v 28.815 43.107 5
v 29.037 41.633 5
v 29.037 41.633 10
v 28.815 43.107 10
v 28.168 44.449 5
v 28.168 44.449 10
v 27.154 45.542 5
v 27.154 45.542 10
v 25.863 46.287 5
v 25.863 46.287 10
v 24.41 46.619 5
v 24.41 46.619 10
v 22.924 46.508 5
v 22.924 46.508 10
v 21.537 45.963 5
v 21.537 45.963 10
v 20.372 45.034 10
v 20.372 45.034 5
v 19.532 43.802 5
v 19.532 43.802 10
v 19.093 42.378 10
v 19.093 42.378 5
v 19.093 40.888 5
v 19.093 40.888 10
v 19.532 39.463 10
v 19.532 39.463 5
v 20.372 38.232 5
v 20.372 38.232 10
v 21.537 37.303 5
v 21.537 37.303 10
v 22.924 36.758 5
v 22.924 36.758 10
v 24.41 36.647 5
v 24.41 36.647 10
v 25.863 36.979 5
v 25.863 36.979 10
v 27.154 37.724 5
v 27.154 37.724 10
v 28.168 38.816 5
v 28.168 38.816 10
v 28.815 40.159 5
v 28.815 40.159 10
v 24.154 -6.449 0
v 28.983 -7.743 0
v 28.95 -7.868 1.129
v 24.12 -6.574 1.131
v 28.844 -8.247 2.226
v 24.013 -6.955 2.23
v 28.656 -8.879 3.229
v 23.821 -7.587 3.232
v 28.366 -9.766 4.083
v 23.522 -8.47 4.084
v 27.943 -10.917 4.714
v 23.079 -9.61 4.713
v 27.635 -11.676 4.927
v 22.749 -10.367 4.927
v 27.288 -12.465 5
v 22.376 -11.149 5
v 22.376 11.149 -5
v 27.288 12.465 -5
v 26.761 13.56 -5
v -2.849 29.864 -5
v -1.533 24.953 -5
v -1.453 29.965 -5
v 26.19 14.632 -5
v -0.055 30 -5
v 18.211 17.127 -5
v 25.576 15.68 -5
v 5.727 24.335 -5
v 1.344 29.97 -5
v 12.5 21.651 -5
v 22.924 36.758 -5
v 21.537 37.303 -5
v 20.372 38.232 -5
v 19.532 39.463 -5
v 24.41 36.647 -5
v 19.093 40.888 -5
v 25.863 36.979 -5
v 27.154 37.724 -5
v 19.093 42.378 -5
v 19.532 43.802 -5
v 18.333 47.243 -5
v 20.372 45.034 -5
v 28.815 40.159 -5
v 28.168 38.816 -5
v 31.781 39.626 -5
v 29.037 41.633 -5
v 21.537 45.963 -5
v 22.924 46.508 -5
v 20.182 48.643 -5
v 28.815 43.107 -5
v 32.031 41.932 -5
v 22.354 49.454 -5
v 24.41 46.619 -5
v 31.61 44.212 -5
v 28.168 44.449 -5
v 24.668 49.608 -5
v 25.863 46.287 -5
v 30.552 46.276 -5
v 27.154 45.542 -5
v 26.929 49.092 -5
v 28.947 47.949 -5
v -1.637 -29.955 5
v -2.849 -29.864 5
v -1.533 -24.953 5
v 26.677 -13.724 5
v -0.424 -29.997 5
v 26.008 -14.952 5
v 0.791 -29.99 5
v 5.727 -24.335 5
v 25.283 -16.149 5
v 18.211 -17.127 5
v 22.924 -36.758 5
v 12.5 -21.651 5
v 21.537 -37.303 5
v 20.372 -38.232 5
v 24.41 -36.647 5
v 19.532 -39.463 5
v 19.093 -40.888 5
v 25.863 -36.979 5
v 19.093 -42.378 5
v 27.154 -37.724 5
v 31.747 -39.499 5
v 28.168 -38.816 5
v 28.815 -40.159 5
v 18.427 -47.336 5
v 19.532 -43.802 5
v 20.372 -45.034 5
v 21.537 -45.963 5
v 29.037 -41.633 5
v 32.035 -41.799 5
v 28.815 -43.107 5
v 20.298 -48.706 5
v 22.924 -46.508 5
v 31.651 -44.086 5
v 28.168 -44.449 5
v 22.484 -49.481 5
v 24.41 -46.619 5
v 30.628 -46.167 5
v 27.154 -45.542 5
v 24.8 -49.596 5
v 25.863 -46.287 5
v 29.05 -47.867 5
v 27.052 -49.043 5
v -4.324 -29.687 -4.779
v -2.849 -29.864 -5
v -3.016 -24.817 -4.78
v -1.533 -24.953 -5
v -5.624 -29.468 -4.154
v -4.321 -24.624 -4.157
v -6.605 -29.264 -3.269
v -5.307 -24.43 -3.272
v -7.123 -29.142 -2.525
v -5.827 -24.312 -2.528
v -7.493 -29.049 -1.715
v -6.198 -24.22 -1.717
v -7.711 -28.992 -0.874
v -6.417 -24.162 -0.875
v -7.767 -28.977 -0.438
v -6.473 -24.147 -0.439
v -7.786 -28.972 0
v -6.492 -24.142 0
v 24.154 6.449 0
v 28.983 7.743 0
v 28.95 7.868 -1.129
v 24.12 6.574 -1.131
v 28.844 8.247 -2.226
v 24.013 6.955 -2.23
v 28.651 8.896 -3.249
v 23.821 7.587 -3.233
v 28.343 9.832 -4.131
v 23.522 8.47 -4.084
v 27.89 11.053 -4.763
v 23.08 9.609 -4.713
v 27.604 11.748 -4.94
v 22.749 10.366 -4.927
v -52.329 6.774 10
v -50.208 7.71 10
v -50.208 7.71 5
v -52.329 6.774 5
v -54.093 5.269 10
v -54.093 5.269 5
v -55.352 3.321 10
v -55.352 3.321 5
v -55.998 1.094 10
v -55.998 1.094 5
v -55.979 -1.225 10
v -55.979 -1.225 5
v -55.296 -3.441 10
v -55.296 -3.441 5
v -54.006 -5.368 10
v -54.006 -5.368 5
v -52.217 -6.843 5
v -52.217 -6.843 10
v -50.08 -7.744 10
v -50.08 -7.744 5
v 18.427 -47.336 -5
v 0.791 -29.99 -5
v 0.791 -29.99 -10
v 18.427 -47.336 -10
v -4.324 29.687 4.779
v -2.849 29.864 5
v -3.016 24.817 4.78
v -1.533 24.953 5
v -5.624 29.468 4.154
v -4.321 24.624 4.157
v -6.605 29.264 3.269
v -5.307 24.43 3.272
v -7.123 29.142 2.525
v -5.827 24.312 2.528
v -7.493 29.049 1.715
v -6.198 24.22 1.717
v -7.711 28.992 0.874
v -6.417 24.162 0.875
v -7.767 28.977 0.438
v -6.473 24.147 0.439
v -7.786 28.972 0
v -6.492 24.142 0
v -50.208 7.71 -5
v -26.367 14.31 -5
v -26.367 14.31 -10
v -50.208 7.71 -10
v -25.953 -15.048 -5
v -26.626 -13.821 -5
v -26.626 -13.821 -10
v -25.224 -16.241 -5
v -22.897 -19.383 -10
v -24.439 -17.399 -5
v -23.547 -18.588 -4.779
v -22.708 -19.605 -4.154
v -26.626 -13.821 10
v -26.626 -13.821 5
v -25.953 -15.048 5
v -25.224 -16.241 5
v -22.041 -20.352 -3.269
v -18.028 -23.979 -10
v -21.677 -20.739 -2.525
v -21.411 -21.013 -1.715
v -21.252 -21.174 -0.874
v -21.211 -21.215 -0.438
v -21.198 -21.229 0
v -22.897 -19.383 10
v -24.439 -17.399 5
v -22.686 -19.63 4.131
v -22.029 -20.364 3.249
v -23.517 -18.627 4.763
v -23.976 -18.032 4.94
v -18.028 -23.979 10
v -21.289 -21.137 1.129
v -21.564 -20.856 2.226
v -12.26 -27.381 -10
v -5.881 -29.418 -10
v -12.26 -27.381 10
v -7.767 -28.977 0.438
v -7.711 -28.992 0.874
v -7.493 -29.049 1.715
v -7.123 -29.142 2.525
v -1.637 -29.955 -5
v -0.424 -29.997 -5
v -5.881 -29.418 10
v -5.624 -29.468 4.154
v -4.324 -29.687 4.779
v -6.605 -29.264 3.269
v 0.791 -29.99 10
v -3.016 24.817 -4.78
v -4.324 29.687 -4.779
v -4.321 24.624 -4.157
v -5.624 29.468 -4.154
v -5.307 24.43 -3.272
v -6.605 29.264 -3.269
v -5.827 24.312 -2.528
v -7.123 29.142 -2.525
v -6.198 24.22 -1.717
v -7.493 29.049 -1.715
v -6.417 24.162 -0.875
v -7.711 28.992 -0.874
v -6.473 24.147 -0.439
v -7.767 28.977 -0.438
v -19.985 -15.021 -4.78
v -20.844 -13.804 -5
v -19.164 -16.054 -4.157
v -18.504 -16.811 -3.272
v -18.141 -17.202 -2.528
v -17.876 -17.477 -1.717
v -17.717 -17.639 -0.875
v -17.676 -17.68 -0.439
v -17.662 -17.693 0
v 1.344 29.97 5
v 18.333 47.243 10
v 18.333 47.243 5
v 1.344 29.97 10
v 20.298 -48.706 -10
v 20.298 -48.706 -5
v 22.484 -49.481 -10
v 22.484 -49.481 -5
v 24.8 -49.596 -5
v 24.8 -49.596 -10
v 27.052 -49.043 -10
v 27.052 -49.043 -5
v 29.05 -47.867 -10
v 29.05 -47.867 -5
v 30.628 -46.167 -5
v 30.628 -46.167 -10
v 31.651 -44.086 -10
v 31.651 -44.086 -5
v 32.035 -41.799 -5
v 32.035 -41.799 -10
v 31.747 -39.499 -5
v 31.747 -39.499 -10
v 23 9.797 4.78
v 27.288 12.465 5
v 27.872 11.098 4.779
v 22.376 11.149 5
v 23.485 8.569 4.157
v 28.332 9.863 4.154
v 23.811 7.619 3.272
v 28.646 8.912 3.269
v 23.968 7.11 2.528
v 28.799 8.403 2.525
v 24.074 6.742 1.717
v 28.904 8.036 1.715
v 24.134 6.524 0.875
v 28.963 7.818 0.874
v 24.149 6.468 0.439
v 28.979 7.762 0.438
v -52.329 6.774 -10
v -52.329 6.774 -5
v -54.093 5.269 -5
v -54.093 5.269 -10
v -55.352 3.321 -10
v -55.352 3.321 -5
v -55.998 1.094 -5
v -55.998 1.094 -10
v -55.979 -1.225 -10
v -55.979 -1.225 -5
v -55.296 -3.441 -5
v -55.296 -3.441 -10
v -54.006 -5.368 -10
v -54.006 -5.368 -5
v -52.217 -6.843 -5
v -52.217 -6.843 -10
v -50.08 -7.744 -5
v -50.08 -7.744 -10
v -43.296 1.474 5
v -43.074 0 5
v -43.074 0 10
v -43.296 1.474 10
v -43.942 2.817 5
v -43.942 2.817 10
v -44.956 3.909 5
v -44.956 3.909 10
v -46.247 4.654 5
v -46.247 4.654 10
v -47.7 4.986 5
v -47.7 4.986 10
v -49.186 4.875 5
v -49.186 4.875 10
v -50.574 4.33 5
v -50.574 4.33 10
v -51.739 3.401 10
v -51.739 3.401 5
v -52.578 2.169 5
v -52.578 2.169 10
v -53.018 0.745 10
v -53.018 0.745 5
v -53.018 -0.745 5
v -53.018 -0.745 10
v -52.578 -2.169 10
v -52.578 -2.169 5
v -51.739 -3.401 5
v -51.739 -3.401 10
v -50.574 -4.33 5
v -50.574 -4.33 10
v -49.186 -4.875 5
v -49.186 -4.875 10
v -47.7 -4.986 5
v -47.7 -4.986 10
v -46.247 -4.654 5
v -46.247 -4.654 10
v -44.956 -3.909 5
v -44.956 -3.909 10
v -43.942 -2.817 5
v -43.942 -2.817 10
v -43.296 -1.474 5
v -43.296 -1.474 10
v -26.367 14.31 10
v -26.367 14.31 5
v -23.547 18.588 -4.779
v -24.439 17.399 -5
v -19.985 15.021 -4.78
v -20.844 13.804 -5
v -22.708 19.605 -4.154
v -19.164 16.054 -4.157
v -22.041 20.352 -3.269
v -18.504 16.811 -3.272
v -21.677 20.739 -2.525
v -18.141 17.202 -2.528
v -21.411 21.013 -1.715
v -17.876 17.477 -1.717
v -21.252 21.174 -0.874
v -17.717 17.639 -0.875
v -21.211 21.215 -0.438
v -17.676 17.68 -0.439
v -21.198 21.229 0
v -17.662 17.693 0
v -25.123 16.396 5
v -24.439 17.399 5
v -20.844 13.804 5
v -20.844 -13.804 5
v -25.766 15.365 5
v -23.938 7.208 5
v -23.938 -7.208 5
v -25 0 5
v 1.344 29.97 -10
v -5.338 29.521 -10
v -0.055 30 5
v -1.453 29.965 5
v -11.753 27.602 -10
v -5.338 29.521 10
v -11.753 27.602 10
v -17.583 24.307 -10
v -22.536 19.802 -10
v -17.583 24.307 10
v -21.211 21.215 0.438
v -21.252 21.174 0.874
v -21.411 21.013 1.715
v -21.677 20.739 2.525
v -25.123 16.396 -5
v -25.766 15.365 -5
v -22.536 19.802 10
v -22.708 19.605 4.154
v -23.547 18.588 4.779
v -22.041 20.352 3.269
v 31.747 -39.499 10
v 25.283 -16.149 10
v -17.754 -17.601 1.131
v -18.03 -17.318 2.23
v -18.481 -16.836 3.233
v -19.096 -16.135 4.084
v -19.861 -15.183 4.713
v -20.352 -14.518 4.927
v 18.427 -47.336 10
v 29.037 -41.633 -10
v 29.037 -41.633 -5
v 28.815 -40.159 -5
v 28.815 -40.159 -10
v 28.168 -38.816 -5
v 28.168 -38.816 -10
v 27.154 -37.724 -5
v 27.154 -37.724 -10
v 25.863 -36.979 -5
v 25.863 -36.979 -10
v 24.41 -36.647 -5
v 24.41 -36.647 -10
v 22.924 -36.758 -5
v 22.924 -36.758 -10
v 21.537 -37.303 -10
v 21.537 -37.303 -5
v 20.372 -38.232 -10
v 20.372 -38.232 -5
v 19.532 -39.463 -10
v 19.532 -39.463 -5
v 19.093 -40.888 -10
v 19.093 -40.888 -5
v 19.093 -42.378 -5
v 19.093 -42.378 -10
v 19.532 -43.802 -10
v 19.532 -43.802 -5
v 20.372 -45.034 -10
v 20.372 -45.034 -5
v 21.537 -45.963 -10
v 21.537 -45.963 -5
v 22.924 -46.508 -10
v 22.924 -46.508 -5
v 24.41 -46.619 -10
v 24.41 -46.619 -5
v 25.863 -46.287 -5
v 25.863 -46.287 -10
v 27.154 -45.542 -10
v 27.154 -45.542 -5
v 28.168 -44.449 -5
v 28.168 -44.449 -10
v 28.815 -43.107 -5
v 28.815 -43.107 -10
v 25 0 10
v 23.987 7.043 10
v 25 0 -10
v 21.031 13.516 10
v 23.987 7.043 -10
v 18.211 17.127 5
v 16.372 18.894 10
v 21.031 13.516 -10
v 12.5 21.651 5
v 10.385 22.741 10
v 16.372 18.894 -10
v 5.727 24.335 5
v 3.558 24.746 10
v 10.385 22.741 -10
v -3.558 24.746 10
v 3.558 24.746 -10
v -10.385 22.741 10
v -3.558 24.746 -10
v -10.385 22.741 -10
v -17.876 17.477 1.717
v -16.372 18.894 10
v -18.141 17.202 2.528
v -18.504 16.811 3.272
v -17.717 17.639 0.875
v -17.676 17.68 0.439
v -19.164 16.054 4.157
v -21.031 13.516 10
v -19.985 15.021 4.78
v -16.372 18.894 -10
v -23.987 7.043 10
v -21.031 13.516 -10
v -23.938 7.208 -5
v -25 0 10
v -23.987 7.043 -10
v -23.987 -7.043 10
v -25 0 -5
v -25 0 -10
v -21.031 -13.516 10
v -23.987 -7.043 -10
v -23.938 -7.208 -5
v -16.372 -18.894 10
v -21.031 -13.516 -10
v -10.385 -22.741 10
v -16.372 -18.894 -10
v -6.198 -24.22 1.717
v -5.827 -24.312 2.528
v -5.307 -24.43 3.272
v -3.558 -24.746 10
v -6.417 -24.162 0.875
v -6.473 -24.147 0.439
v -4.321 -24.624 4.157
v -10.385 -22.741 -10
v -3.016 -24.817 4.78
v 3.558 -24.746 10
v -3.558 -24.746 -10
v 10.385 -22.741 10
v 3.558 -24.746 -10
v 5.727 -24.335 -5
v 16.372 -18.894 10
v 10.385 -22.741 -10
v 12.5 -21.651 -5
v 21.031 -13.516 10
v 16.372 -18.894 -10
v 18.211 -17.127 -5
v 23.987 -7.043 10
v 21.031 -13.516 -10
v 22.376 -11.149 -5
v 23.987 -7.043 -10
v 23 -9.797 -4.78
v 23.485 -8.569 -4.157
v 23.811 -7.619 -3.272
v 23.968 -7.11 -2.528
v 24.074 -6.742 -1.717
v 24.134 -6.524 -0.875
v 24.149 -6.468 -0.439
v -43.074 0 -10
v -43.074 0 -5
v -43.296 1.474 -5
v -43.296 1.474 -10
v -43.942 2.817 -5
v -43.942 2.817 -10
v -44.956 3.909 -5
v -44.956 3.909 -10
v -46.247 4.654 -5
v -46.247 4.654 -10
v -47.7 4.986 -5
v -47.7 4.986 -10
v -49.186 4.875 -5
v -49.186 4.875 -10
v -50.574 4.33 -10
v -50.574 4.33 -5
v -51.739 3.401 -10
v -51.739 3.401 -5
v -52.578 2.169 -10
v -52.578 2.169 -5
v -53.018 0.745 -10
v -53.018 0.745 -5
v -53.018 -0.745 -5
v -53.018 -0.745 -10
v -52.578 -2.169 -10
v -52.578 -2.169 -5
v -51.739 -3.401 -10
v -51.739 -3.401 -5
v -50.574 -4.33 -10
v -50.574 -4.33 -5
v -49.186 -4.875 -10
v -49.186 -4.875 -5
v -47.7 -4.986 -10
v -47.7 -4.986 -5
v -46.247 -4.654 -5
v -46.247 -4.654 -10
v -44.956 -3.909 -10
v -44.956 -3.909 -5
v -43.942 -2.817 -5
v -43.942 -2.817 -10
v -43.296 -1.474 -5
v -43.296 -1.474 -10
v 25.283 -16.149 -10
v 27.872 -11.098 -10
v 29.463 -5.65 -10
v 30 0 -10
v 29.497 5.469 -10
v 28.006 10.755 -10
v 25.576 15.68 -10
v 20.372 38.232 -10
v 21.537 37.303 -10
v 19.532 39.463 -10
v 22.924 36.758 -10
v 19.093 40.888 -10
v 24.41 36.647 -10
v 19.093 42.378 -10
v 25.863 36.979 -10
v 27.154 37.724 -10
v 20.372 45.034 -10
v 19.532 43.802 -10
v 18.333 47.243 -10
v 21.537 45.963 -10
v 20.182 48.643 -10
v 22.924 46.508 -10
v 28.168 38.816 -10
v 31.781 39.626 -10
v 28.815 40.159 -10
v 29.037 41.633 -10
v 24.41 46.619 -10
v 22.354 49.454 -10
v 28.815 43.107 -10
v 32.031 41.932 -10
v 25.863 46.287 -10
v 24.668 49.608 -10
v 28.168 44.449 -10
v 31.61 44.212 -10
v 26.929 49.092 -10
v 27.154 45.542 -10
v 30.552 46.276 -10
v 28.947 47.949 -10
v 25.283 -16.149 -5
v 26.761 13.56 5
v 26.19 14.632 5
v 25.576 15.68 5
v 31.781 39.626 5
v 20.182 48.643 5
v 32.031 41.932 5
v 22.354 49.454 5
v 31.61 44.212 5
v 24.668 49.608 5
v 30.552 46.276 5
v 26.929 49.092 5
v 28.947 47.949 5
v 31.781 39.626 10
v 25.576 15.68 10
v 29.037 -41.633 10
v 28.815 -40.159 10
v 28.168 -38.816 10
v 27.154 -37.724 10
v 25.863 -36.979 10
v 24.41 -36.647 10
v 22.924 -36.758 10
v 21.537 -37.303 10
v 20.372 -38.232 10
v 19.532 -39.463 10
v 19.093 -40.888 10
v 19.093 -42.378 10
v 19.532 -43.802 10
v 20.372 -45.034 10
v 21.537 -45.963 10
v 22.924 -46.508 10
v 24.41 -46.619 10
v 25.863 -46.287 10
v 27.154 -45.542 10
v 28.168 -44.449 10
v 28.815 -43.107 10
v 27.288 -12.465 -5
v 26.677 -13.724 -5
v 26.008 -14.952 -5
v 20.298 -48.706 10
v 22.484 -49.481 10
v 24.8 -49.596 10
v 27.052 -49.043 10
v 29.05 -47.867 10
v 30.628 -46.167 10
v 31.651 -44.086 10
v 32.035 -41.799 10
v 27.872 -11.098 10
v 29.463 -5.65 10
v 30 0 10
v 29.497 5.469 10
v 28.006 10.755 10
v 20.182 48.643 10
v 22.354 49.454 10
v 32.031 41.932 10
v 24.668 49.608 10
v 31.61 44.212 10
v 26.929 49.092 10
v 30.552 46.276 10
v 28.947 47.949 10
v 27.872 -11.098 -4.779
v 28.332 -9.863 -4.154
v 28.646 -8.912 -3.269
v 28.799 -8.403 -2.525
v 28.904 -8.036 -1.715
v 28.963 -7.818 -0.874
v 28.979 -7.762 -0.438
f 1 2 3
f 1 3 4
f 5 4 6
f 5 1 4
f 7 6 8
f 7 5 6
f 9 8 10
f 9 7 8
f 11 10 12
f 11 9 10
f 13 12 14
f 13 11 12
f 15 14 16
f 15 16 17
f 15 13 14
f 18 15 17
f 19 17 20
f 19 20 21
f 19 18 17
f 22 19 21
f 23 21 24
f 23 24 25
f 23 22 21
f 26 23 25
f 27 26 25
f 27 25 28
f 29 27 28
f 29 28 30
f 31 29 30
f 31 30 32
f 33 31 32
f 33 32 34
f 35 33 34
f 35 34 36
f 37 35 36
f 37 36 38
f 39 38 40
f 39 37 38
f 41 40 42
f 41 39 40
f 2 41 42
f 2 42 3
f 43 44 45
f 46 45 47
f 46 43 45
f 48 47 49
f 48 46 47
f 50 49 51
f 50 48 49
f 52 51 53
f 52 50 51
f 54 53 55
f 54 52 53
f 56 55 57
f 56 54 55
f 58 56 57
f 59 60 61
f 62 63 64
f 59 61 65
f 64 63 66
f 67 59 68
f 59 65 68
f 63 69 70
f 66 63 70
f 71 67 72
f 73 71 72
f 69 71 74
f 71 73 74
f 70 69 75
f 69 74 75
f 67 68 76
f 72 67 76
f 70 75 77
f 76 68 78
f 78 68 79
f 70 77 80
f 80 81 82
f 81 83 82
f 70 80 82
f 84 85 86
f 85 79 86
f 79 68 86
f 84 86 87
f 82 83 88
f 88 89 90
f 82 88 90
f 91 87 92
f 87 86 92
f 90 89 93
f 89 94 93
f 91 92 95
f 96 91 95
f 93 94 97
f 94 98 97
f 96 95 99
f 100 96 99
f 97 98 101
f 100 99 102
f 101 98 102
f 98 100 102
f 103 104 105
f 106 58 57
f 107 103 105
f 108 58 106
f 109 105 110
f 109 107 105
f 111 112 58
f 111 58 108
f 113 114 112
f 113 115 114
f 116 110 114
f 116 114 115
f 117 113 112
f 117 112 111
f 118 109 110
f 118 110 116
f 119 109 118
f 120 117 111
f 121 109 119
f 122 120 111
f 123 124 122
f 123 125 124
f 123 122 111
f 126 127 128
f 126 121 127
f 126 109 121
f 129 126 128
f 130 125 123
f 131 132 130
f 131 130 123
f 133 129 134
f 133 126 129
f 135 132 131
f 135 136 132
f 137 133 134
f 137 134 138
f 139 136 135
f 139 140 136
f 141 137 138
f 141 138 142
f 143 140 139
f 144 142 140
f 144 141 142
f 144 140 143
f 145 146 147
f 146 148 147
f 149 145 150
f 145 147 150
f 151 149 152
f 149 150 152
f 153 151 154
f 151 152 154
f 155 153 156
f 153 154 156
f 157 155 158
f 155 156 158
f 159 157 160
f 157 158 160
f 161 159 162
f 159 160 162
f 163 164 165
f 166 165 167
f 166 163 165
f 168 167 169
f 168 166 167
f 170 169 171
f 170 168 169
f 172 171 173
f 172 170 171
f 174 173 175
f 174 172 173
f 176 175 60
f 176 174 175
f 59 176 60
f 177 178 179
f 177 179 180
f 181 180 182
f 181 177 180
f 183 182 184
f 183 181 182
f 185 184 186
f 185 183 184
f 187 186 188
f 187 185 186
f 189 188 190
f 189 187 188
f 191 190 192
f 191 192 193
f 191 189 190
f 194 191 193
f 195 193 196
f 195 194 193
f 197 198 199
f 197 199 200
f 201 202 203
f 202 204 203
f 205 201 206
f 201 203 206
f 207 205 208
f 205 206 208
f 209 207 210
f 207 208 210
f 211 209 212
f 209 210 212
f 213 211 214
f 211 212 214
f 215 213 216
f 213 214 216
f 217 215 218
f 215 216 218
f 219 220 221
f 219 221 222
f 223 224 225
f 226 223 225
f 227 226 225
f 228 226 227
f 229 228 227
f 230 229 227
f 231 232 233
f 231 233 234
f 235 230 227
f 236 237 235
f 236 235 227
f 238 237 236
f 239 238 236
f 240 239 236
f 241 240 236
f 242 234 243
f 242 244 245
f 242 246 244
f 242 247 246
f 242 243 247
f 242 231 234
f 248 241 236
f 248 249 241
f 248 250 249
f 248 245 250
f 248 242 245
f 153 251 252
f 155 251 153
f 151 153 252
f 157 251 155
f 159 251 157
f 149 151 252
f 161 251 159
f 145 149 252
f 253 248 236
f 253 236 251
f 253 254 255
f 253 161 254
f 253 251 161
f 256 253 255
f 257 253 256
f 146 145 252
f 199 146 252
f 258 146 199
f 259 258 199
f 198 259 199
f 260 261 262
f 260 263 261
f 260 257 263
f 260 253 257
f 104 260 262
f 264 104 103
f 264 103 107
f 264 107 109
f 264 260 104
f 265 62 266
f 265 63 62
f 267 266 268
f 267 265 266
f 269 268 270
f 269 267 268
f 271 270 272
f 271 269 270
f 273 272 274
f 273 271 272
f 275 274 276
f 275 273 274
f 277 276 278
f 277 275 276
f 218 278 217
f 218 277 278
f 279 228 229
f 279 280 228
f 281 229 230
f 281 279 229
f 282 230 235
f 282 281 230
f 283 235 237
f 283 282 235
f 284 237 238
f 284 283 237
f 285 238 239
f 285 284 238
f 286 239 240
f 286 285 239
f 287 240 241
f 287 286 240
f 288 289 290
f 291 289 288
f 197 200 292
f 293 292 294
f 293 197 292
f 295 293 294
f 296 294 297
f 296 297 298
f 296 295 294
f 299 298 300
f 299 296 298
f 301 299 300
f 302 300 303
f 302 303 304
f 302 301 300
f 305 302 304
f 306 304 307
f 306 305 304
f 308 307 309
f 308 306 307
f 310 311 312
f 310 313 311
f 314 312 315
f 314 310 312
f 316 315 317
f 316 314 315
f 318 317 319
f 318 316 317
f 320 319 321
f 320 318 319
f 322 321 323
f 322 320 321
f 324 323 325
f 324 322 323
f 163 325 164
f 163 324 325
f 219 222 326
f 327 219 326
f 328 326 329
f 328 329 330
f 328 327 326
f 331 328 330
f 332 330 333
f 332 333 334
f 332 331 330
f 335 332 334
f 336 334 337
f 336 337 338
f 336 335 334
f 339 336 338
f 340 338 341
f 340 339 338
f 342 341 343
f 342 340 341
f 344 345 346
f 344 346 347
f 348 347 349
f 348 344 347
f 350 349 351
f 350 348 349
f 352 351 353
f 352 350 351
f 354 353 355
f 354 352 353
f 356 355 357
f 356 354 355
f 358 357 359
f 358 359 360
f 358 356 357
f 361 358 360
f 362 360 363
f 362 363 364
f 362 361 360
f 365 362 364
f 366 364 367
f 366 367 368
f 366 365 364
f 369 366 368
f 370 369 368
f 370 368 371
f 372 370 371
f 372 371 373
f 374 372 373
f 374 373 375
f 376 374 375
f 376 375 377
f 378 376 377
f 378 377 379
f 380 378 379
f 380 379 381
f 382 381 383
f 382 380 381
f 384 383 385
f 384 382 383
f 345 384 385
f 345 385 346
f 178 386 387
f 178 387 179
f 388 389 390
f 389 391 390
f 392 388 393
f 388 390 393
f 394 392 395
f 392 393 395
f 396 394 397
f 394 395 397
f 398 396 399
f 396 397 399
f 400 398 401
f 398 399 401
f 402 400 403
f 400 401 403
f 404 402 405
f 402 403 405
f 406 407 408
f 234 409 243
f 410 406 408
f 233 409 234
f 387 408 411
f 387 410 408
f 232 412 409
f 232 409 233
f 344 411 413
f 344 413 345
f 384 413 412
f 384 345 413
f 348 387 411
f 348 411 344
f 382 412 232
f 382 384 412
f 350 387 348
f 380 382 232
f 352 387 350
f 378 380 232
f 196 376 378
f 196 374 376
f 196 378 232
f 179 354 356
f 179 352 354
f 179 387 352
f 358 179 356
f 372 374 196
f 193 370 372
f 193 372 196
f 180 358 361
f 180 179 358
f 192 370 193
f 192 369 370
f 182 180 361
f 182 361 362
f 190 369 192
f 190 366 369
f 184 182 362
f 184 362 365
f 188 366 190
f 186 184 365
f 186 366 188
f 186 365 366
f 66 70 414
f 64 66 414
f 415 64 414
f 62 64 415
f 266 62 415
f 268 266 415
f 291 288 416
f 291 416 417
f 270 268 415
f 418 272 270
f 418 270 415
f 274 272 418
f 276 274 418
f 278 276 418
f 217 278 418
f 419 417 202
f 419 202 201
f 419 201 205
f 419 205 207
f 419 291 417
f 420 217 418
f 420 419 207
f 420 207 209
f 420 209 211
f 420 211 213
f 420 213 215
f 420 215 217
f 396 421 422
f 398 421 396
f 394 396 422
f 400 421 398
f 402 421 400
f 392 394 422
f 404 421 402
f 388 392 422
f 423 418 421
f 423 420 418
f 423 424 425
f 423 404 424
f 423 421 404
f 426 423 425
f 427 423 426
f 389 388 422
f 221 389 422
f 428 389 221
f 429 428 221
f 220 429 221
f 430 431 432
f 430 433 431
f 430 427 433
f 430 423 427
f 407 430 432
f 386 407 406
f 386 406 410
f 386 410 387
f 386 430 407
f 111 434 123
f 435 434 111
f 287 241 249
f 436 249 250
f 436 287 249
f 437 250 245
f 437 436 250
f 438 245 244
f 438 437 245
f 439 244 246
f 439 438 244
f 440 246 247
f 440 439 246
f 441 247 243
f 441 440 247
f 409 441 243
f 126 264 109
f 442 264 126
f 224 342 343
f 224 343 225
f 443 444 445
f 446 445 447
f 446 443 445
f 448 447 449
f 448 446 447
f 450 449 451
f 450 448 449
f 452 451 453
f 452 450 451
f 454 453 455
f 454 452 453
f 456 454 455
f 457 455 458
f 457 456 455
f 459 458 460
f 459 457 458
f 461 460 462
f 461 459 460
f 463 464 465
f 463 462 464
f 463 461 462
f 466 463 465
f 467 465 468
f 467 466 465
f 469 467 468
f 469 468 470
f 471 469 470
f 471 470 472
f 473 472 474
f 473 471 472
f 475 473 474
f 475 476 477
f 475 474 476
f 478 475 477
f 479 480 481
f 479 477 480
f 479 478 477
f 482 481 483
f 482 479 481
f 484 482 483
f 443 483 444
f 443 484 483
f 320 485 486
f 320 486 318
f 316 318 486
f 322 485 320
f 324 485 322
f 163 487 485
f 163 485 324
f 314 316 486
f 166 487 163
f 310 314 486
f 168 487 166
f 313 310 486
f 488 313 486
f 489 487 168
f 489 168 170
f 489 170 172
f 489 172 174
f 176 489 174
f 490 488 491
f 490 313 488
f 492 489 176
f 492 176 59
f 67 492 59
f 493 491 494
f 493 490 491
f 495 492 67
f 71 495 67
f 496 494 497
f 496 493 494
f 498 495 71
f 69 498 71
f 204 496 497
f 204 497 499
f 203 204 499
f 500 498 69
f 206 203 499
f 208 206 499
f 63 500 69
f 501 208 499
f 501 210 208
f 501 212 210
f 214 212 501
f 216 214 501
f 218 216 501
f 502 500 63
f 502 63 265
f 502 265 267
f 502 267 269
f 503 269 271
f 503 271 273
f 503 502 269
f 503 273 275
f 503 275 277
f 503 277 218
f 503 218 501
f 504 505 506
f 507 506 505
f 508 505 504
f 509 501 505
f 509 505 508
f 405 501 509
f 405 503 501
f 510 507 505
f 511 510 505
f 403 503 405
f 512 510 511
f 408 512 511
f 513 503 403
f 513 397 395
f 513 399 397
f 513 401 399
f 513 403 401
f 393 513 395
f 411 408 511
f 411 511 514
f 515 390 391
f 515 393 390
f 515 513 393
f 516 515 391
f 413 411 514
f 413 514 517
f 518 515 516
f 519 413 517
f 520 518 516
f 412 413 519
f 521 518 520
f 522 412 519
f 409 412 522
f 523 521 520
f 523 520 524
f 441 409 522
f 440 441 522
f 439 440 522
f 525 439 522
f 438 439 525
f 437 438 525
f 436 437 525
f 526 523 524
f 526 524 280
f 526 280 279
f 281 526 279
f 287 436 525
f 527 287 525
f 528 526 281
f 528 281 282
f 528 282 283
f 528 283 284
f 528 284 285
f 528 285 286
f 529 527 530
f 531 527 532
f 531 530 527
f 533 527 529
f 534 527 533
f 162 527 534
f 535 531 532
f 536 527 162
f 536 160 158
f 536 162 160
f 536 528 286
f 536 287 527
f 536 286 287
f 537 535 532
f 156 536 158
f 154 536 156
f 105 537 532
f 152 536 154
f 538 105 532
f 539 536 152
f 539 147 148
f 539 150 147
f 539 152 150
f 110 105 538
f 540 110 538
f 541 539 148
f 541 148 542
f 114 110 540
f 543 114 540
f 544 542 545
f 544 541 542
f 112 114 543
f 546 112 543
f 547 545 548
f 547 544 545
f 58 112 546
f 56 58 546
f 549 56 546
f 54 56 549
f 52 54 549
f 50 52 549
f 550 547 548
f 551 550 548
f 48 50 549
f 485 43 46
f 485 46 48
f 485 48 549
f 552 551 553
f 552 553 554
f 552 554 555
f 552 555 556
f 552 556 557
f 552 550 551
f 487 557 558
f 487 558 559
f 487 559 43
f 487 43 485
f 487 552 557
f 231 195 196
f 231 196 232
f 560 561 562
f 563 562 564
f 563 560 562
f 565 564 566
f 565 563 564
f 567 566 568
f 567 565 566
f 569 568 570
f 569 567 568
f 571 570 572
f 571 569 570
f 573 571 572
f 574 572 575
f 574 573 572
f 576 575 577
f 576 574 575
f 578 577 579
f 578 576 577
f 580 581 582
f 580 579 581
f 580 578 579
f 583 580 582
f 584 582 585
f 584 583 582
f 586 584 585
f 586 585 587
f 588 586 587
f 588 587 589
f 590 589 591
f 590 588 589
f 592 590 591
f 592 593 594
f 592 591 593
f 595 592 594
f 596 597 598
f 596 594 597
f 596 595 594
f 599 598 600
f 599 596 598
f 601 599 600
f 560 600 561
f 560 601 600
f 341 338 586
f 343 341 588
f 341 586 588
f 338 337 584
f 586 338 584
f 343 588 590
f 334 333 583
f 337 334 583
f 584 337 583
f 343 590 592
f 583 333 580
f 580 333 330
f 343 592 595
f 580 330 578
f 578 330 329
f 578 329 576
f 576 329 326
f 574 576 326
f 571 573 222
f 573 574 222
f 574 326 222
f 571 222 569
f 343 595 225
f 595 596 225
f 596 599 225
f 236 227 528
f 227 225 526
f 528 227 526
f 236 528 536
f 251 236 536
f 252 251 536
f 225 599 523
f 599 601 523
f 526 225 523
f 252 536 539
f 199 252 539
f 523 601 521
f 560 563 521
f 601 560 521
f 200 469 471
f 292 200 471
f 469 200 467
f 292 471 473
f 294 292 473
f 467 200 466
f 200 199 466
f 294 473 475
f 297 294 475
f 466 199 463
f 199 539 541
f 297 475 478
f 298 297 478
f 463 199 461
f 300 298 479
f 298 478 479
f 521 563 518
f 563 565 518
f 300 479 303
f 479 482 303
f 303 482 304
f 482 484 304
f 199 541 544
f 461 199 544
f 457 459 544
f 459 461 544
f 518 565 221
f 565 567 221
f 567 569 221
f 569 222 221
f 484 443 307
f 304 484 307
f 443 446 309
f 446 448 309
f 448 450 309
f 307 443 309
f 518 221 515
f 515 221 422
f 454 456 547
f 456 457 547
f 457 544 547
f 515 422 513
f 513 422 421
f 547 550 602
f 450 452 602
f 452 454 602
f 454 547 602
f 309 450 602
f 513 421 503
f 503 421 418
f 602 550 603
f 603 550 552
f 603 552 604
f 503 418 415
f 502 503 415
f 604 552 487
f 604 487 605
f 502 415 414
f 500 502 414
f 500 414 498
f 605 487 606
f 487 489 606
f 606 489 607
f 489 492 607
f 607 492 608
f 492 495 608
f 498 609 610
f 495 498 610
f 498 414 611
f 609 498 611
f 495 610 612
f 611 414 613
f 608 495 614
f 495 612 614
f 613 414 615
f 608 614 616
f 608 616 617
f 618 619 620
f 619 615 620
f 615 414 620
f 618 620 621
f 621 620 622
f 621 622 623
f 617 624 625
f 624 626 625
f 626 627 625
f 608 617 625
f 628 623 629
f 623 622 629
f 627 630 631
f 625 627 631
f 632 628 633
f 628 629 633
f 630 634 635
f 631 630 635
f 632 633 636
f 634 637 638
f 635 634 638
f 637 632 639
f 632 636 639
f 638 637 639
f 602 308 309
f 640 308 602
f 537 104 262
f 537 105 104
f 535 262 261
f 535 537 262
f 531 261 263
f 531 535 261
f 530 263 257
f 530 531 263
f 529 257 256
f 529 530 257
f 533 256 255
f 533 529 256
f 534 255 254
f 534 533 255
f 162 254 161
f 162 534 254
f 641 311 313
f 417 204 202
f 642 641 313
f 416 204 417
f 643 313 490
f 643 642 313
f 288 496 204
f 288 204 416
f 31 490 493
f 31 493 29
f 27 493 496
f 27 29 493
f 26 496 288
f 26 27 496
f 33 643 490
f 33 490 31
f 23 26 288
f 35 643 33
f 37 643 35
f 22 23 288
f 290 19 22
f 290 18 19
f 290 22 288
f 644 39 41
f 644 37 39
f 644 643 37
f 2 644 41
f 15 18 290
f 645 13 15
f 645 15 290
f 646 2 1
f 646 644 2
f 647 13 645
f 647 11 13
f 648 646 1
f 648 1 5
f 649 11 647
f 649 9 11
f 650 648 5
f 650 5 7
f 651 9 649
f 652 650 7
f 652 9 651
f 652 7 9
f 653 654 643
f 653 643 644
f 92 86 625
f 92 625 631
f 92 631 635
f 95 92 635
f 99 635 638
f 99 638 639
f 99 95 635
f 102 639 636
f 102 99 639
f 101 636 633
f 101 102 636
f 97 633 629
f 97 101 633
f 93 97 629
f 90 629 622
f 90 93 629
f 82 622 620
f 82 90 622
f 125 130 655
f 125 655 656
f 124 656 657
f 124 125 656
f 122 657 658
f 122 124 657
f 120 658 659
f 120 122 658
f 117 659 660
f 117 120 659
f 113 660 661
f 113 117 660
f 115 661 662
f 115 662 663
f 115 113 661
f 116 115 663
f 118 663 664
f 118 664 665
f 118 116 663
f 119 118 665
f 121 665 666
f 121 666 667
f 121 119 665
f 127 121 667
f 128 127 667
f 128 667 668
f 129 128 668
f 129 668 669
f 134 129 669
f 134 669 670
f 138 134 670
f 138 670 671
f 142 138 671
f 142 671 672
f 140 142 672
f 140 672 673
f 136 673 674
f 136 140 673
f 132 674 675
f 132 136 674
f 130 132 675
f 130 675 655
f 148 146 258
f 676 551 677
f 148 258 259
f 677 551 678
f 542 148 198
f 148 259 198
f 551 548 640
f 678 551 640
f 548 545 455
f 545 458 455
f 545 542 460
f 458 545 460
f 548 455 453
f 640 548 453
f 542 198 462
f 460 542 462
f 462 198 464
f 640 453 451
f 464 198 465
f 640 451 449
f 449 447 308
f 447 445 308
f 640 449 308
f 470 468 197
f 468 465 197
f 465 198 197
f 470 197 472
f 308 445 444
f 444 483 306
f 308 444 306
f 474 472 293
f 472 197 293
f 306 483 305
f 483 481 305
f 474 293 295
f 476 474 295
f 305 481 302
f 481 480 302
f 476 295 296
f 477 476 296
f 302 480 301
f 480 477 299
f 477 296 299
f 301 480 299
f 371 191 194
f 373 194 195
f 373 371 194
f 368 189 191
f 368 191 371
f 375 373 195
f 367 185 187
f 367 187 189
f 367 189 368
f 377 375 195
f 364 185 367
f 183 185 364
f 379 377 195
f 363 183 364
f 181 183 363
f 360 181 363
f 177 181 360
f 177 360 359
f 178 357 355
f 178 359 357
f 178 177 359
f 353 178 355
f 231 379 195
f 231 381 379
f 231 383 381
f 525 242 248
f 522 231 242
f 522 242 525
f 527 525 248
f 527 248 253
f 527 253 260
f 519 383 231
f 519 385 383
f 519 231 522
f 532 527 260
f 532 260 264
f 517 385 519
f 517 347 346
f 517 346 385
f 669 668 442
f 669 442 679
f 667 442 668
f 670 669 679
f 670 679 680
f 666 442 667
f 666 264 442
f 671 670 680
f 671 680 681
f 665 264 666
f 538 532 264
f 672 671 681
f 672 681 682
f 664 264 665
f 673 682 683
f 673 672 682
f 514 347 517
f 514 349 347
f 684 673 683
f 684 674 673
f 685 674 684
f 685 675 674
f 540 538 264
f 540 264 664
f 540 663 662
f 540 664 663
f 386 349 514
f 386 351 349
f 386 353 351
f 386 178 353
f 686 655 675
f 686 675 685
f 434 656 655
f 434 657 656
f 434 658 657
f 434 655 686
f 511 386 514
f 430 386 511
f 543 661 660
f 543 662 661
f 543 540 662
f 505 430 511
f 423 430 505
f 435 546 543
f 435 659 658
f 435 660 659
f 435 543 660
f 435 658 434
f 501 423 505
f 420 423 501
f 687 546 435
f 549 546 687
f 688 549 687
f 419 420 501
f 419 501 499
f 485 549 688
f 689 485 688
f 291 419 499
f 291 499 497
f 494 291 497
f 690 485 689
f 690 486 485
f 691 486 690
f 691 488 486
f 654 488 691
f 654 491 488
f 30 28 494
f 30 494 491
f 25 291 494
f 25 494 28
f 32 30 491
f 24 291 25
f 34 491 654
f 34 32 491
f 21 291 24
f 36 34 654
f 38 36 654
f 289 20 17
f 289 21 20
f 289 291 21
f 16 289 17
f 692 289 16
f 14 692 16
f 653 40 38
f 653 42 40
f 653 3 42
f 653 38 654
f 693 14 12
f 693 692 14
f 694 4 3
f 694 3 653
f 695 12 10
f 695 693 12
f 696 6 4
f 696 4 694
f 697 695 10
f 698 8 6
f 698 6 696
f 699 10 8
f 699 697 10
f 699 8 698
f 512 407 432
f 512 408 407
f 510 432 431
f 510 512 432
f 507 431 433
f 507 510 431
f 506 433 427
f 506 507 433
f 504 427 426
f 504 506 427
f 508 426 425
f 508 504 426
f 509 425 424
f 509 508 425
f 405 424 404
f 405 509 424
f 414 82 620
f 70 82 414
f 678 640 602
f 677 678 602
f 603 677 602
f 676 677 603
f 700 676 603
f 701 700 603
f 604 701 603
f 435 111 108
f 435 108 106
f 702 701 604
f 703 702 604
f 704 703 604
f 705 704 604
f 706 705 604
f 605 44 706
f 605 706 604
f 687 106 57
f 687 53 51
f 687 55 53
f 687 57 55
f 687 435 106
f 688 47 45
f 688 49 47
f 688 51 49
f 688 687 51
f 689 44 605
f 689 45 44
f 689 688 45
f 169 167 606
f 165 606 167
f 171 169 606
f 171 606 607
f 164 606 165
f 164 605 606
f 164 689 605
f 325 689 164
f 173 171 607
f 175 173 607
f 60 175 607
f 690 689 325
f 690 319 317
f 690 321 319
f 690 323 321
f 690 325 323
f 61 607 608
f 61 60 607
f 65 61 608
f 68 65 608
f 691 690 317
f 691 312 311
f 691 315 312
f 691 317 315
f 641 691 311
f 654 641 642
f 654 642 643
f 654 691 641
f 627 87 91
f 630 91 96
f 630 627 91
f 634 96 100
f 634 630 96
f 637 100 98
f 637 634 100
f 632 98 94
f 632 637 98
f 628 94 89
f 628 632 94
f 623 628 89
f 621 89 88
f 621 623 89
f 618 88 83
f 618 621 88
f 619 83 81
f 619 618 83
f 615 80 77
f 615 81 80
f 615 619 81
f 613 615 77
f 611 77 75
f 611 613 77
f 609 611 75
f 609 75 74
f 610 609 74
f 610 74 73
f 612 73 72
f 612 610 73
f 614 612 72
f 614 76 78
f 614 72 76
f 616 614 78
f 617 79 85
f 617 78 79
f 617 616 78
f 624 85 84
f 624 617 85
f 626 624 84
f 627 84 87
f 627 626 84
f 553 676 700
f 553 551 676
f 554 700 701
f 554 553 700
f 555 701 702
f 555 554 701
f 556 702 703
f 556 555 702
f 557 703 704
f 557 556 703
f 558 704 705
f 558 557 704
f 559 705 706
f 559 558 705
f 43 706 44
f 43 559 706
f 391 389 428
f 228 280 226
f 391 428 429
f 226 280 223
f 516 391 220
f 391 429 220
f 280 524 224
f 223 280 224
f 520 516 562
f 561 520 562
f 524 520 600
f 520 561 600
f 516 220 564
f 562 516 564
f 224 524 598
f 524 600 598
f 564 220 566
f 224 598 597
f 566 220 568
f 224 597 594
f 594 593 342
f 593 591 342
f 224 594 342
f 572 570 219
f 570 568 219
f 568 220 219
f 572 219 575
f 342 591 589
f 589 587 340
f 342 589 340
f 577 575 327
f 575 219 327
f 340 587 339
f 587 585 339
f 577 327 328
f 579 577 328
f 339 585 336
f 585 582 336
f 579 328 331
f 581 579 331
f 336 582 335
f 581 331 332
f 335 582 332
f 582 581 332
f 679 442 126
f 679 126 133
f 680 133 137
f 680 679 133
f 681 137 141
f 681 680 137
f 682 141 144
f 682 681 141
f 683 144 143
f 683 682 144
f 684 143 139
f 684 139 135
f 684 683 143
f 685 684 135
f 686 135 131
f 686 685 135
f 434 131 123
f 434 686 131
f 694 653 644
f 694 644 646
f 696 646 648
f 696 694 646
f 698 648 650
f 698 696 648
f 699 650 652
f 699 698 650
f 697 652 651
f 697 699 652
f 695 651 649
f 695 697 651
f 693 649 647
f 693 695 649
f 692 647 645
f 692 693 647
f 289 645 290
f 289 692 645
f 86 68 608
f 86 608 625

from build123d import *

# Parameters (mm, degrees)
F0_R          = 25
F0_R_2        = 5
F1_DEPTH      = 10
F1_DEPTH_BACK = 10
F2_W          = 70
F2_H          = 10
F3_ANGLE_BACK = 45
F3_ANGLE      = 90
F4_COUNT      = 3
F4_ANGLE      = 240
F6_R          = 4.99999


# Not quite as in the source:
# - a fillet or chamfer is up to 0.001 mm smaller than in the source, because OpenCascade refuses the exact size


with BuildPart() as f1:
    # F0 (on Top) → F1 (new body, two sides)
    with BuildSketch(Plane.XY) as f1_sk:
        with BuildLine():
            ThreePointArc((25.282899435, -16.1485292259), (28.7965881924, -8.4116888004), (30, 0))
            ThreePointArc((30, 0), (28.8728814443, 8.1459632398), (25.5762188598, 15.6798287247))
            ThreePointArc((25.5762188598, 15.6798287247), (15.2387828621, 25.8414298537), (1.3435868258, 29.969897805))
            ThreePointArc((1.3435868258, 29.969897805), (-14.7599432924, 26.1178880081), (-26.3672394325, 14.3097409029))
            ThreePointArc((-26.3672394325, 14.3097409029), (-29.9987261544, 0.2764581545), (-26.6264862609, -13.8213685791))
            ThreePointArc((-26.6264862609, -13.8213685791), (-15.2387828621, -25.8414298537), (0.7910205727, -29.9895696277))
            ThreePointArc((0.7910205727, -29.9895696277), (14.7599432924, -26.1178880081), (25.282899435, -16.1485292259))
        make_face()
        Circle(F0_R, mode=Mode.SUBTRACT)
        with BuildLine():
            ThreePointArc((1.3435868258, 29.969897805), (15.2387828621, 25.8414298537), (25.5762188598, 15.6798287247))
            Line((25.5762188598, 15.6798287247), (31.7810181804, 39.6262733222))
            ThreePointArc((31.7810181804, 39.6262733222), (27.9793762729, 48.5939196708), (18.3333577354, 47.2428132348))
            Line((18.3333577354, 47.2428132348), (1.3435868258, 29.969897805))
        make_face()
        with Locations((24.0367650986, 41.6328984003)):
            Circle(F0_R_2, mode=Mode.SUBTRACT)
        with BuildLine():
            Line((31.7467975399, -39.4985601529), (25.282899435, -16.1485292259))
            ThreePointArc((25.282899435, -16.1485292259), (14.7599432924, -26.1178880081), (0.7910205727, -29.9895696277))
            Line((0.7910205727, -29.9895696277), (18.4268502641, -47.3363057635))
            ThreePointArc((18.4268502641, -47.3363057635), (28.0938807679, -48.5278104698), (31.7467975399, -39.4985601529))
        make_face()
        with Locations((24.0367650986, -41.6328984003)):
            Circle(F0_R_2, mode=Mode.SUBTRACT)
        with BuildLine():
            ThreePointArc((-26.6264862609, -13.8213685791), (-29.9987261544, 0.2764581545), (-26.3672394325, 14.3097409029))
            Line((-26.3672394325, 14.3097409029), (-50.2078684445, 7.7100324413))
            ThreePointArc((-50.2078684445, 7.7100324413), (-56.0732570408, -0.066109201), (-50.0801552753, -7.7442530819))
            Line((-50.0801552753, -7.7442530819), (-26.6264862609, -13.8213685791))
        make_face()
        with Locations((-48.0735301971, 0)):
            Circle(F0_R_2, mode=Mode.SUBTRACT)
    extrude(amount=F1_DEPTH)
    extrude(f1_sk.sketch, amount=-F1_DEPTH_BACK)


with BuildPart() as f3:
    # F2 (on Front) → F3 (revolve)
    with BuildSketch(Plane.XZ, mode=Mode.PRIVATE) as f3_sk:
        with Locations((-34.9688172646, 0)):
            Rectangle(F2_W, F2_H)
    revolve(f3_sk.sketch.rotate(Axis((0.0311827354, 0, 0), (0, 0, -1)), -F3_ANGLE_BACK), axis=Axis((0.0311827354, 0, 0), (0, 0, -1)), revolution_arc=F3_ANGLE)


with BuildPart() as f4_1:
    # F4: instance of F3
    add(f3.part.rotate(Axis((0, 0, 10), (0, 0, -1)), 1 * F4_ANGLE / (F4_COUNT - 1)))


with BuildPart() as f4_2:
    # F4: instance of F3
    add(f3.part.rotate(Axis((0, 0, 10), (0, 0, -1)), 2 * F4_ANGLE / (F4_COUNT - 1)))


with BuildPart() as f1_1:
    add(f1.part)

    # F5: cut F3, F4_1, F4_2
    add(f3.part, mode=Mode.SUBTRACT)
    add(f4_1.part, mode=Mode.SUBTRACT)
    add(f4_2.part, mode=Mode.SUBTRACT)

    # F6 (radius 5 in the source; OpenCascade refuses exactly that, so slightly less here)
    f6_edges = [f1_1.edges().sort_by_distance(p)[0] for p in [
        (26.568658, 7.096223, 5),
        (26.568658, 7.096223, -5),
        (26.568658, -7.096223, -5),
        (26.568658, -7.096223, 5),
        (-7.13882, -26.557245, 5),
        (-7.13882, -26.557245, -5),
        (-19.429839, 19.461022, -5),
        (-7.13882, 26.557245, -5),
        (-19.429839, 19.461022, 5),
        (-7.13882, 26.557245, 5),
        (-19.429839, -19.461022, -5),
        (-19.429839, -19.461022, 5),
    ]]
    fillet(f6_edges, radius=F6_R)


solid = f1_1.part
